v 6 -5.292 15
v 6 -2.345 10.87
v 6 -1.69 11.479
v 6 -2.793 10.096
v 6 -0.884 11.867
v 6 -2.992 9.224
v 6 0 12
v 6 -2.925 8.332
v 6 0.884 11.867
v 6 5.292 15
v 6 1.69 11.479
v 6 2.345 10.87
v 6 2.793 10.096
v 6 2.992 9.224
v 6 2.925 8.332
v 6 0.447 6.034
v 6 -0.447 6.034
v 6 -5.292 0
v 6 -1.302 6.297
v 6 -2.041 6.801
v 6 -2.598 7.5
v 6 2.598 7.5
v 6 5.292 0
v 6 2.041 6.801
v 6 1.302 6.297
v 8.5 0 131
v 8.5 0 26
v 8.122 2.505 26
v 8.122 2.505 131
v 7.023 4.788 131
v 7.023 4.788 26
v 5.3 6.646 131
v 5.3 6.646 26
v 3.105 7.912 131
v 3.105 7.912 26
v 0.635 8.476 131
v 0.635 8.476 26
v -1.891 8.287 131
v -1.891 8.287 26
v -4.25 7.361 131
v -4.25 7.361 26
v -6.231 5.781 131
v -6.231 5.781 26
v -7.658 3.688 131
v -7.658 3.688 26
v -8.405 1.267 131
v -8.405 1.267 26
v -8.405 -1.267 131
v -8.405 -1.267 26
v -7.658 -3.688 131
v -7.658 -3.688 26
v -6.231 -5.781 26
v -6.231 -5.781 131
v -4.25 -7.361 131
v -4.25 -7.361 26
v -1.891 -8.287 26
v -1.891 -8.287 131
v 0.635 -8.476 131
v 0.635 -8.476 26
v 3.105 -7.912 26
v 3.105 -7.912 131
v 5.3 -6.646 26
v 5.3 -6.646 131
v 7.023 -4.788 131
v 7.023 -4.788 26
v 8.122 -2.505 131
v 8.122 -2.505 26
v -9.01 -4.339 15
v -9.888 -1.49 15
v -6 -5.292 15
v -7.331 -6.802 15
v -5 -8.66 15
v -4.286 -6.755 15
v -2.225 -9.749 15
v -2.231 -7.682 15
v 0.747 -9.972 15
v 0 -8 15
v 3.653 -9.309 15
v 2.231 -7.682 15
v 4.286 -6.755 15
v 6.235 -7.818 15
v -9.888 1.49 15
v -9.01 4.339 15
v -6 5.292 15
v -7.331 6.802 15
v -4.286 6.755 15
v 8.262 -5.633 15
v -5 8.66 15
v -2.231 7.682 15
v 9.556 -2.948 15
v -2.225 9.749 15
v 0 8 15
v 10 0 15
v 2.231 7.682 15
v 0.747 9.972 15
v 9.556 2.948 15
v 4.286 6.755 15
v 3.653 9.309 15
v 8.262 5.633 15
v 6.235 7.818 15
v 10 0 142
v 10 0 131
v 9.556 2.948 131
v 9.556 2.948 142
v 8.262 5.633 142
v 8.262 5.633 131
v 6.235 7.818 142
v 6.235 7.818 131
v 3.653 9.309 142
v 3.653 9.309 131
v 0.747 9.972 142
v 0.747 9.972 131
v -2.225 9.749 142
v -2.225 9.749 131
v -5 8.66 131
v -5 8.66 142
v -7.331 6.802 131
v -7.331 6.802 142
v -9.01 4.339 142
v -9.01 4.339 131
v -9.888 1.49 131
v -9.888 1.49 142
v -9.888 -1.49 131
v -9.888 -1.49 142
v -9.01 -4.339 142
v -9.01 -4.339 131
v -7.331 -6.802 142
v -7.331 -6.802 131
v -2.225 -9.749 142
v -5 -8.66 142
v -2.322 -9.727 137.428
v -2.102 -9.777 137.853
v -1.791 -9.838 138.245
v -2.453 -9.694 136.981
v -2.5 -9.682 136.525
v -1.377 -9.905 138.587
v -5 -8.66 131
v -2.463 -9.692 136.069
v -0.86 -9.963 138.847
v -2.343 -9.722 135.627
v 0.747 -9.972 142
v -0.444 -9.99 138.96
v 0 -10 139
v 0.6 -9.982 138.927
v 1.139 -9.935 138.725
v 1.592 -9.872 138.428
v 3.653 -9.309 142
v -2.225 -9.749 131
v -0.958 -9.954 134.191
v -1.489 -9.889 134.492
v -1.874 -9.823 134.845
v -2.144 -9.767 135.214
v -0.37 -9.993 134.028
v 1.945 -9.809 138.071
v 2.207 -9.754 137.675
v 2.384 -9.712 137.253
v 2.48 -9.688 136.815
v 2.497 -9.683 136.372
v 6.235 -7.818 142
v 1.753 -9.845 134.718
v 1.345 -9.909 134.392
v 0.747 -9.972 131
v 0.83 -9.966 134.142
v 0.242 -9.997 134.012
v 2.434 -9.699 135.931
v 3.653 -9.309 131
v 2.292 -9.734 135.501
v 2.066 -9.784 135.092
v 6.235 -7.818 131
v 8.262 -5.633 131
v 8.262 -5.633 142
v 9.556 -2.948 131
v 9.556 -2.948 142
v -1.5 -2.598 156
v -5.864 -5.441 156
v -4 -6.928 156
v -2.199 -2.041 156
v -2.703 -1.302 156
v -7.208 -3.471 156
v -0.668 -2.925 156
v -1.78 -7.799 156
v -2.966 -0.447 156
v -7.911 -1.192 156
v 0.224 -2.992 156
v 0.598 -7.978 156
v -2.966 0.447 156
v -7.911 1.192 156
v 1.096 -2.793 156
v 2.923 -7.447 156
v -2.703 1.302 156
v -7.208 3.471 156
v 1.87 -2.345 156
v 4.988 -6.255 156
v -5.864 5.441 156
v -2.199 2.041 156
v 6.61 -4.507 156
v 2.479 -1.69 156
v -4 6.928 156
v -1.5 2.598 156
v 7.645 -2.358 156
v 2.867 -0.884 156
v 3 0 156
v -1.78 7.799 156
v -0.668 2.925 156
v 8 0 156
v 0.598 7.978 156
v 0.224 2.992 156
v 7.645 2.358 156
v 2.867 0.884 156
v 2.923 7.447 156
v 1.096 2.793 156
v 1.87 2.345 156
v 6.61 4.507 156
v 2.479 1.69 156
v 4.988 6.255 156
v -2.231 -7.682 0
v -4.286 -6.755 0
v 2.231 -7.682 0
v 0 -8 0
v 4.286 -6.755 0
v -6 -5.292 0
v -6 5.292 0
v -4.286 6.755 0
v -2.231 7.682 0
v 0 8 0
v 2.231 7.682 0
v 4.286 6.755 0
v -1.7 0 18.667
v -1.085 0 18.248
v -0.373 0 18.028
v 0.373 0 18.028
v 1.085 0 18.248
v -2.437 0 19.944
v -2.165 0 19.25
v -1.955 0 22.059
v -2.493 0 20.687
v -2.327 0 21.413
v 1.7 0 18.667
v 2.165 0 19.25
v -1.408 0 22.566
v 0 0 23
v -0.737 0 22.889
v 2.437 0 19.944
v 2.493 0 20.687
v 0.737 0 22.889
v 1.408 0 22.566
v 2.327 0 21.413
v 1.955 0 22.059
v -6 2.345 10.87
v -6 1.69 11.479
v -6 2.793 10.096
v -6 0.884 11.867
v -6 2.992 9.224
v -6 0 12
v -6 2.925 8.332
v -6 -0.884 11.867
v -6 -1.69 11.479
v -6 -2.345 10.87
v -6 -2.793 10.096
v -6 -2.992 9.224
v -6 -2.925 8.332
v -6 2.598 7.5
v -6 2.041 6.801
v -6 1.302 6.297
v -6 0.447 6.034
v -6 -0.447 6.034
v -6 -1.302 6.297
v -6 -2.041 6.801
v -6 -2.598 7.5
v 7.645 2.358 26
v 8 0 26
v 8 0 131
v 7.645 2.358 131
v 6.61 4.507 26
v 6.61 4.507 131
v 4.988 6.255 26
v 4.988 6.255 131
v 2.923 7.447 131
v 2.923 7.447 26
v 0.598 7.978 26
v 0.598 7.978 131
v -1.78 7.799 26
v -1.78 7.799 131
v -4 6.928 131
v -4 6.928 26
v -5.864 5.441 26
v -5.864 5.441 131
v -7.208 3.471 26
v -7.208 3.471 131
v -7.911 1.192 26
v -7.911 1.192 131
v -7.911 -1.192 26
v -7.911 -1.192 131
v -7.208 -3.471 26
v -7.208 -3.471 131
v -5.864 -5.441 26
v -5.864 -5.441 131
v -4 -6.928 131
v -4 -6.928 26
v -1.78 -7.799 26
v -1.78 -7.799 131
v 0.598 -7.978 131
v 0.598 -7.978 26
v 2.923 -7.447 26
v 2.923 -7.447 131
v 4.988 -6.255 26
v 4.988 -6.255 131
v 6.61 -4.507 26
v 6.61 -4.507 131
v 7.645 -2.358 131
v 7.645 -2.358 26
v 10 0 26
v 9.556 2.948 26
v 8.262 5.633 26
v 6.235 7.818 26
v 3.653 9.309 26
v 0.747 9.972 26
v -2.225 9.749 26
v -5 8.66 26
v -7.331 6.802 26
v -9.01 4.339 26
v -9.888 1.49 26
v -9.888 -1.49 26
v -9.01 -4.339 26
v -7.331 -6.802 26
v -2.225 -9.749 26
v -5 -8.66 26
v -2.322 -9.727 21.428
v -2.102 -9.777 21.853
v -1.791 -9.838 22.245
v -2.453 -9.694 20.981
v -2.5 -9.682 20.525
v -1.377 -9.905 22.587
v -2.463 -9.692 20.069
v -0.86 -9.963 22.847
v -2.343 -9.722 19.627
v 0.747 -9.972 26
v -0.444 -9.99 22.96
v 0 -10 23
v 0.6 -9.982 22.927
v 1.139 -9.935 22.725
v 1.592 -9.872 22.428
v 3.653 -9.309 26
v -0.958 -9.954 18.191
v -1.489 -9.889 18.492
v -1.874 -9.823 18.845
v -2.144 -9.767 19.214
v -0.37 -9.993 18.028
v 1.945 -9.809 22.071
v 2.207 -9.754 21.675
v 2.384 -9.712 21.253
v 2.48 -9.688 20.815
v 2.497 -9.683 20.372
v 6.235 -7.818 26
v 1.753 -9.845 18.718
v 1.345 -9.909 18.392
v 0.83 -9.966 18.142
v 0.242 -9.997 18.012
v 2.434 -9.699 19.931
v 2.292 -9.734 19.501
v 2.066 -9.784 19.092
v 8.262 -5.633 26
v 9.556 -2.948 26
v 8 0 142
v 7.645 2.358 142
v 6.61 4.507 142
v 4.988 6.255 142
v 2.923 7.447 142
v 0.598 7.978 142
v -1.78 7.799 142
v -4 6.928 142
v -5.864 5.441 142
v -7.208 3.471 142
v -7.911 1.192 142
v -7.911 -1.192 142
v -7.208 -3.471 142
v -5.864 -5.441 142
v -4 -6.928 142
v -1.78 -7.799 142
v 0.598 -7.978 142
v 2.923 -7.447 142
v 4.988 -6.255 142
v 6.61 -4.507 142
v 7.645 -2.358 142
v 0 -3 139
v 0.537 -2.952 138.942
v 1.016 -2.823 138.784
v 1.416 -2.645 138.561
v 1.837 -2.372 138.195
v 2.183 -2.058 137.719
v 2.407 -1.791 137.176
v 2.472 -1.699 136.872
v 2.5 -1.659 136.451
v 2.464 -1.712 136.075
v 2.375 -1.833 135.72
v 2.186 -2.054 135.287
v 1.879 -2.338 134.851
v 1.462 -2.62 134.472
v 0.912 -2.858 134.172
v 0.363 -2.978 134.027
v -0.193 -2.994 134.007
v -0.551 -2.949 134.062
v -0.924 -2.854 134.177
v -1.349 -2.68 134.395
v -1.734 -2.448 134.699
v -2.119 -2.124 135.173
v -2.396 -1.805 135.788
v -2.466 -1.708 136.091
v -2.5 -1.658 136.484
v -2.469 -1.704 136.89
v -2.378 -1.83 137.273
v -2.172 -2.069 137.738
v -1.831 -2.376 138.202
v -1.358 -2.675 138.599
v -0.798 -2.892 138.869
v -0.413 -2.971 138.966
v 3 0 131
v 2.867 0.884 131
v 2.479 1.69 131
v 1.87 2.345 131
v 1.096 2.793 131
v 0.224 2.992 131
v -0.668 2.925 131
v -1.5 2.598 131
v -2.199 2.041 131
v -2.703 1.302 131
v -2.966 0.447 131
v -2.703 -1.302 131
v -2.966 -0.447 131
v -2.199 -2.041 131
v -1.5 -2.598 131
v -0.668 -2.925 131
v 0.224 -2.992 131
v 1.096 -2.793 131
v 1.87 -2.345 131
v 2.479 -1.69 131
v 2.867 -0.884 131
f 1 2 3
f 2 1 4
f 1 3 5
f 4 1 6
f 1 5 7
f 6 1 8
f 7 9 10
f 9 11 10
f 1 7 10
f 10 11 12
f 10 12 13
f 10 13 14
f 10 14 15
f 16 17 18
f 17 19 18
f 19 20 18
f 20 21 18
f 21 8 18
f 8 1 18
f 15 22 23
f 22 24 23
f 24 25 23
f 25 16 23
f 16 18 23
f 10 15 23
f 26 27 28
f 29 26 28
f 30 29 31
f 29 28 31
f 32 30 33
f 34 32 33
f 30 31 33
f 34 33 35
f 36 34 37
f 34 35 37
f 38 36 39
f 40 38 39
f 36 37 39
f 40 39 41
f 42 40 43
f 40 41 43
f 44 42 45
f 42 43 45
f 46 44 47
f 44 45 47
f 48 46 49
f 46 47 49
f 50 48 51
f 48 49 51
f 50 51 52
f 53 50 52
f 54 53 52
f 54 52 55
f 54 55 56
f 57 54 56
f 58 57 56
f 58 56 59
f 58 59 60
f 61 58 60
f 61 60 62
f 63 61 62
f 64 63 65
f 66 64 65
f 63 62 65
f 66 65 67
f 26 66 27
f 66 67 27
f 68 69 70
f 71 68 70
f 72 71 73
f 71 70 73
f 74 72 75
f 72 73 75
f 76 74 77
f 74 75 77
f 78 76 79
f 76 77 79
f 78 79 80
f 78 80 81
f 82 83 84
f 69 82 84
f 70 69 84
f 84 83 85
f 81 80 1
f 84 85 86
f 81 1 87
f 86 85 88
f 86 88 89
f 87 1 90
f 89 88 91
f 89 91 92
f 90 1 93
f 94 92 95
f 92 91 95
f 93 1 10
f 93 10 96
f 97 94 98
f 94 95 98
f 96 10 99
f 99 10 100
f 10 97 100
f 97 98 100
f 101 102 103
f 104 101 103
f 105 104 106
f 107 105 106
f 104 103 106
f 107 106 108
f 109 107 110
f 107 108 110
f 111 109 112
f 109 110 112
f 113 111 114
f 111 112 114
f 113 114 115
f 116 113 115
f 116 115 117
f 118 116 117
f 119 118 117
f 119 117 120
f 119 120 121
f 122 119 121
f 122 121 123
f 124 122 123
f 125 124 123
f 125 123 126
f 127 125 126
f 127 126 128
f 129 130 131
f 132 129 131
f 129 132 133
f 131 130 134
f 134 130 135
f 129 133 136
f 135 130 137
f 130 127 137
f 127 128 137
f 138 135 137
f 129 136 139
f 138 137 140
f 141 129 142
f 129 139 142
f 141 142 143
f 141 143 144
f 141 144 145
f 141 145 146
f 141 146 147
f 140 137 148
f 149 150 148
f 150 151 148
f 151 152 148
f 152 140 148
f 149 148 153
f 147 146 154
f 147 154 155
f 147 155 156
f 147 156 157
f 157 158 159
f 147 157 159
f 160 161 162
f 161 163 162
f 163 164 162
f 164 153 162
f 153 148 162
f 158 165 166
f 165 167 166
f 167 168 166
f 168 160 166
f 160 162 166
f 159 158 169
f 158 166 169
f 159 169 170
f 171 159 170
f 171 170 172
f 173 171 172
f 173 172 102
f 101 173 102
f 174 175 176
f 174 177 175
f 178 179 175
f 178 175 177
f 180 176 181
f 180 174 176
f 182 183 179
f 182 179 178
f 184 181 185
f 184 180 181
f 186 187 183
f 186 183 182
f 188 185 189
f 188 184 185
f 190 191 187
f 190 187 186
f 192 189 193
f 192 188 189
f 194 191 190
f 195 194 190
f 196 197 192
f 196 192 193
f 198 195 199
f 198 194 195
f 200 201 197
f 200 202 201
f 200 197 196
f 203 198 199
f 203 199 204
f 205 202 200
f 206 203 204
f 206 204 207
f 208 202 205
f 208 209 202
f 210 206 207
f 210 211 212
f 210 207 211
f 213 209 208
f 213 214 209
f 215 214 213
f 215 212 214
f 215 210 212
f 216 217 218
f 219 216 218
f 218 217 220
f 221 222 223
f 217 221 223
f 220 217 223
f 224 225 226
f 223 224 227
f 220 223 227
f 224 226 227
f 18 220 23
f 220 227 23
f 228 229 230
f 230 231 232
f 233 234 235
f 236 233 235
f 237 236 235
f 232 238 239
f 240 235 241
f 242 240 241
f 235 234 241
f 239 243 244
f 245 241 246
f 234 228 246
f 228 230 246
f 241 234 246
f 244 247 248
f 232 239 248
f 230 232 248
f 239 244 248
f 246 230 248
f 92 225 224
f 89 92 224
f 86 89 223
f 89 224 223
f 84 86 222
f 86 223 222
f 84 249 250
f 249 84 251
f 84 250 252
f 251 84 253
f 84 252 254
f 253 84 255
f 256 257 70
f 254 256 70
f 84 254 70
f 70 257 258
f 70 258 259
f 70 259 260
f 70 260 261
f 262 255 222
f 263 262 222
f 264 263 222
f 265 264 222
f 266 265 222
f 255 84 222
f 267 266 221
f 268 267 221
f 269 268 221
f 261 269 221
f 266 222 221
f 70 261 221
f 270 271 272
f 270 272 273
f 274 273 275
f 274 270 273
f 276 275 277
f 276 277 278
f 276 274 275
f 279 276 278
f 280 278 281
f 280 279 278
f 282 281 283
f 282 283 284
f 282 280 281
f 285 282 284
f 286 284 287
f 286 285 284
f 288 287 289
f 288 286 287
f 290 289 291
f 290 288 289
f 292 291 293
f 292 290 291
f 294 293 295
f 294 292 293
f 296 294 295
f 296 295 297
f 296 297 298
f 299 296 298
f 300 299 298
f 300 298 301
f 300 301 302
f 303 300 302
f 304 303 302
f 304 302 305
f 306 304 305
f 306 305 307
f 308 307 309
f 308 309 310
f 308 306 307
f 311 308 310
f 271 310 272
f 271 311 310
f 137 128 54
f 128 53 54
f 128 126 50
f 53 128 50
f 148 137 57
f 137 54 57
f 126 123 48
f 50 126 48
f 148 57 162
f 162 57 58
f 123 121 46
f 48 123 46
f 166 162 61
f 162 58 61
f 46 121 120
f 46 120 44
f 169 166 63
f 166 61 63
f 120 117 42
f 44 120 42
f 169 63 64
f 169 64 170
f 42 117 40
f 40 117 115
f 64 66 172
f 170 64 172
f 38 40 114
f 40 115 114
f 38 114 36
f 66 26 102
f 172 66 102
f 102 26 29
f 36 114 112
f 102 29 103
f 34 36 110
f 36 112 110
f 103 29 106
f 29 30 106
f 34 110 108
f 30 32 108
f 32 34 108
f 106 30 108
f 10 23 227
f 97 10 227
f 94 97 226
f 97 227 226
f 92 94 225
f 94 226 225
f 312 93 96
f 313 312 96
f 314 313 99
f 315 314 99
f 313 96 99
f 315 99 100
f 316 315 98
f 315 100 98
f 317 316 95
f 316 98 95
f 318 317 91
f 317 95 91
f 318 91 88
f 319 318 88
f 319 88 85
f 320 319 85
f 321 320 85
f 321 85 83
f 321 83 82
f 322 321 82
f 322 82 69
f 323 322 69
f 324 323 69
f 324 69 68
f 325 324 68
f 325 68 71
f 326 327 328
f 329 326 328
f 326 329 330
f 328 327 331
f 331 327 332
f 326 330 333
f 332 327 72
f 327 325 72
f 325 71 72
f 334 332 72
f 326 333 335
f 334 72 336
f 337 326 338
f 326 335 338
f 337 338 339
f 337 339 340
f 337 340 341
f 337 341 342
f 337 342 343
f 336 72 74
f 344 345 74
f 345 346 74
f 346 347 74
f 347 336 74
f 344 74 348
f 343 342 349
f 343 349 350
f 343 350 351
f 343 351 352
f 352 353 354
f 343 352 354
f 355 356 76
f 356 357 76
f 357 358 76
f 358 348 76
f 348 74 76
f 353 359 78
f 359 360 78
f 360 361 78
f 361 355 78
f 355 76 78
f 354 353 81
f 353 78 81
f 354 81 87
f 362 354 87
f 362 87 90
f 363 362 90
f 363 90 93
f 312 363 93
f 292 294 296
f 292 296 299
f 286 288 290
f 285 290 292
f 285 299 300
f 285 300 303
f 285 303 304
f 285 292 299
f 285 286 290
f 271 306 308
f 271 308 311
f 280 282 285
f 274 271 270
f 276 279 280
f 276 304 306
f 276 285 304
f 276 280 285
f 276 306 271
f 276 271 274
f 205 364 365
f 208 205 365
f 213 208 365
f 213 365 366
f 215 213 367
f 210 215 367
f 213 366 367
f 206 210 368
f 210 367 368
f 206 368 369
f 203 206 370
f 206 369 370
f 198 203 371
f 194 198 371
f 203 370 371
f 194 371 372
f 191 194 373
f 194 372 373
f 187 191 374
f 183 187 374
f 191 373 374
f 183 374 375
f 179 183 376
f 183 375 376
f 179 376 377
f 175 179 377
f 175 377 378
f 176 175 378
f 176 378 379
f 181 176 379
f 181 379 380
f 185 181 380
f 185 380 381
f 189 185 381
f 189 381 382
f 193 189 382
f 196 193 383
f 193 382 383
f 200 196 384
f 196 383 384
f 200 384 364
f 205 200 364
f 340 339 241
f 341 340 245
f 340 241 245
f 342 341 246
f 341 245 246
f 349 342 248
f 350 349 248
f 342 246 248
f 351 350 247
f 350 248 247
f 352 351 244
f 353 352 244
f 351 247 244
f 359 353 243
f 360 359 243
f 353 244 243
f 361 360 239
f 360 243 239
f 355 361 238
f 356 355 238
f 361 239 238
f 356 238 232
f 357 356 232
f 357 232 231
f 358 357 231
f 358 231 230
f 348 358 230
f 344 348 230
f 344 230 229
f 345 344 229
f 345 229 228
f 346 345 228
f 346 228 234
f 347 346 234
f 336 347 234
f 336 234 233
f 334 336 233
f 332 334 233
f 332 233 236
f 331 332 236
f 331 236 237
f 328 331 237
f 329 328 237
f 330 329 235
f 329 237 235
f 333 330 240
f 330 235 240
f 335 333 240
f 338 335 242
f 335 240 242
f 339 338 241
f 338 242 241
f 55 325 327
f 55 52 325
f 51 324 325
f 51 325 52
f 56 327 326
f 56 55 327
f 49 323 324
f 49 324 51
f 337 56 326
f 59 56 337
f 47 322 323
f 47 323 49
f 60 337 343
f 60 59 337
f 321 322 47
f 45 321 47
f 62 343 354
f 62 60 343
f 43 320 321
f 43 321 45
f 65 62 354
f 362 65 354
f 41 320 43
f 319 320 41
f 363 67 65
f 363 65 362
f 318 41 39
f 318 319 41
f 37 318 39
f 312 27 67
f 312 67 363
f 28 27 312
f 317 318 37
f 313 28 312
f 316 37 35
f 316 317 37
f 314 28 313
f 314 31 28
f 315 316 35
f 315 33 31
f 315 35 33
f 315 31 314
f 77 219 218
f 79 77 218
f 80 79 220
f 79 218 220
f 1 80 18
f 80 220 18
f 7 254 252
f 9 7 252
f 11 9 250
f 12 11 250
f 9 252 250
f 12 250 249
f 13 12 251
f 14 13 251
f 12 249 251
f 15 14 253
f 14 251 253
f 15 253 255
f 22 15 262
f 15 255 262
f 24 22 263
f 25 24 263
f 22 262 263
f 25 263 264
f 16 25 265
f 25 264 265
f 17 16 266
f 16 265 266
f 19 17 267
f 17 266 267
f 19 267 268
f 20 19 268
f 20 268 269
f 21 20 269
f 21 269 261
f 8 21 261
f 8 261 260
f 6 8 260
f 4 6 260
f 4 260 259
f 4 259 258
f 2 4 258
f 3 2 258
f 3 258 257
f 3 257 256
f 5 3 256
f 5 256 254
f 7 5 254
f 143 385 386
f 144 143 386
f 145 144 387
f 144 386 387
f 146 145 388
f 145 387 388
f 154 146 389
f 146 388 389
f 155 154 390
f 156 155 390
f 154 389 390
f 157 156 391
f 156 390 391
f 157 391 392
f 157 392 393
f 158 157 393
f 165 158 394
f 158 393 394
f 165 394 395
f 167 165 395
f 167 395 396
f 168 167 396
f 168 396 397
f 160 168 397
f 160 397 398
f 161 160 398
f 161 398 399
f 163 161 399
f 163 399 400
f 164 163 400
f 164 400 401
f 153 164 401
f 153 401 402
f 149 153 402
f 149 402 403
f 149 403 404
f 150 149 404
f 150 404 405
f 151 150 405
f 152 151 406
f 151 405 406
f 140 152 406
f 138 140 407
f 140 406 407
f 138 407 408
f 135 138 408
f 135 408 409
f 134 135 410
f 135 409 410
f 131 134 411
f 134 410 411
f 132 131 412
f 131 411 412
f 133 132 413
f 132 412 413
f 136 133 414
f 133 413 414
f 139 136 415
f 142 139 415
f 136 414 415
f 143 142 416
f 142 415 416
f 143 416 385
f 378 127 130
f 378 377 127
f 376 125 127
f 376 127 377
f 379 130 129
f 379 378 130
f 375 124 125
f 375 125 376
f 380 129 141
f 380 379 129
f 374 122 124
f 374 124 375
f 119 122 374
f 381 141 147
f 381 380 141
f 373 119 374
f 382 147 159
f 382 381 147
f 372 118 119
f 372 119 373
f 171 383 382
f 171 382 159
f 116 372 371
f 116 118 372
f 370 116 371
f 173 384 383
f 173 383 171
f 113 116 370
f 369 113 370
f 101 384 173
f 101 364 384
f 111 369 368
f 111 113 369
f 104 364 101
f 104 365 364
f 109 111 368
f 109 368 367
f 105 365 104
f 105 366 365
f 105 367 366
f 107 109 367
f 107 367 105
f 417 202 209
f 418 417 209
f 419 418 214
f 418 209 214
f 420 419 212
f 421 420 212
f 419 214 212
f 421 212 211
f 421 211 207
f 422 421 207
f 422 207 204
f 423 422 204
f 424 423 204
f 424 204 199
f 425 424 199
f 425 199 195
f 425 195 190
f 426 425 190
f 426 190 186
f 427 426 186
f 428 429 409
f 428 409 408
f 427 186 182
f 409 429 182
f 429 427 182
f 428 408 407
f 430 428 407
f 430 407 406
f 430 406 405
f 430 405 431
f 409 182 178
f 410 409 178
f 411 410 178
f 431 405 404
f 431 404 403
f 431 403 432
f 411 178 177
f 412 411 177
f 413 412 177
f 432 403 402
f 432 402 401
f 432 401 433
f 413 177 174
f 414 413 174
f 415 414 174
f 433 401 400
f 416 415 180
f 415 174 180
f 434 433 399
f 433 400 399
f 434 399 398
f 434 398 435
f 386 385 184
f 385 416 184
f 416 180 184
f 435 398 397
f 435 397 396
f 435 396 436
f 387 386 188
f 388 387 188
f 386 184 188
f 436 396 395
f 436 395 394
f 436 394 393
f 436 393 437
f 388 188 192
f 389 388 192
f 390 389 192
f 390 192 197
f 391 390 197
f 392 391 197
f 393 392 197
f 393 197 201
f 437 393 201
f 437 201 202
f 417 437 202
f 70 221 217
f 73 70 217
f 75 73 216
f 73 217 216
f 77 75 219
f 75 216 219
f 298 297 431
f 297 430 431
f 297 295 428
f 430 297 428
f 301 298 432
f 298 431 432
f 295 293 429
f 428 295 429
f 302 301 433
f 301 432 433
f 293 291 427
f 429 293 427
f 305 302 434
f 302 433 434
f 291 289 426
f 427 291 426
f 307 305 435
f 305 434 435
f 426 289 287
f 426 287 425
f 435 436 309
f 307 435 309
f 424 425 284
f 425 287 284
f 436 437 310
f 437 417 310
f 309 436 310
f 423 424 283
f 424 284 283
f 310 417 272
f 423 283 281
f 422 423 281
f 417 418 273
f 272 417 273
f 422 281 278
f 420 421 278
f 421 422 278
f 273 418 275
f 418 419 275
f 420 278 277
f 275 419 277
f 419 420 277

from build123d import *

# Parameters (mm, degrees)
EXTRUDE_1_DEPTH     = 15
SKETCH_2_R          = 3
CUT_EXTRUDE_1_DEPTH = 21.808652047
SKETCH_3_R          = 10
EXTRUDE_2_DEPTH     = 11
SKETCH_4_R          = 2.5
CUT_EXTRUDE_3_DEPTH = 10
SKETCH_5_R          = 8.5
SKETCH_5_R_2        = 8
EXTRUDE_4_DEPTH     = 105
SKETCH_6_R          = 10
EXTRUDE_5_DEPTH     = 11
SKETCH_7_R          = 2.5
CUT_EXTRUDE_4_DEPTH = 10
SKETCH_8_R          = 8
EXTRUDE_6_DEPTH     = 14
SKETCH_9_R          = 3
CUT_EXTRUDE_5_DEPTH = 100


with BuildPart() as part:
    # 草图1 → 凸台-拉伸1 (new body)
    with BuildSketch(Plane.XY):
        with BuildLine():
            ThreePointArc((0, 8), (-3.291502622, 7.291502622), (-6, 5.291502622))
            Line((-6, 5.291502622), (-6, -5.291502622))
            ThreePointArc((-6, -5.291502622), (-3.291502622, -7.291502622), (0, -8))
            Line((0, -8), (0, 8))
        make_face()
        with BuildLine():
            ThreePointArc((6, 5.291502622), (3.291502622, 7.291502622), (0, 8))
            Line((0, 8), (0, -8))
            ThreePointArc((0, -8), (3.291502622, -7.291502622), (6, -5.291502622))
            Line((6, -5.291502622), (6, 5.291502622))
        make_face()
    extrude(amount=EXTRUDE_1_DEPTH)

    # 草图2 → 切除-拉伸1 (cut, through all)
    with BuildSketch(Plane.ZY.offset(6)):
        with Locations((9, 0)):
            Circle(SKETCH_2_R)
    extrude(amount=-CUT_EXTRUDE_1_DEPTH, mode=Mode.SUBTRACT)

    # 草图3 → 凸台-拉伸2 (add)
    with BuildSketch(Plane.XY.offset(15)):
        Circle(SKETCH_3_R)
    extrude(amount=EXTRUDE_2_DEPTH)

    # 草图4 → 切除-拉伸3 (cut)
    with BuildSketch(Plane(origin=(0, 0, 0), x_dir=(1, 0, 0), z_dir=(0, 1, 0))):
        with Locations(Location((0, -20.5, 0), (0, 0, 270))):
            Circle(SKETCH_4_R)
    extrude(amount=-CUT_EXTRUDE_3_DEPTH, mode=Mode.SUBTRACT)

    # 草图5 → 凸台-拉伸4 (add)
    with BuildSketch(Plane.XY.offset(26)):
        Circle(SKETCH_5_R)
        Circle(SKETCH_5_R_2, mode=Mode.SUBTRACT)
    extrude(amount=EXTRUDE_4_DEPTH)

    # 草图6 → 凸台-拉伸5 (add)
    with BuildSketch(Plane.XY.offset(131)):
        Circle(SKETCH_6_R)
    extrude(amount=EXTRUDE_5_DEPTH)

    # 草图7 → 切除-拉伸4 (cut)
    with BuildSketch(Plane(origin=(0, 0, 0), x_dir=(1, 0, 0), z_dir=(0, 1, 0))):
        with Locations(Location((0, -136.5, 0), (0, 0, 270))):
            Circle(SKETCH_7_R)
    extrude(amount=-CUT_EXTRUDE_4_DEPTH, mode=Mode.SUBTRACT)

    # 草图8 → 凸台-拉伸6 (add)
    with BuildSketch(Plane.XY.offset(142)):
        Circle(SKETCH_8_R)
    extrude(amount=EXTRUDE_6_DEPTH)

    # 草图9 → 切除-拉伸5 (cut)
    with BuildSketch(Plane.XY.offset(156)):
        Circle(SKETCH_9_R)
    extrude(amount=-CUT_EXTRUDE_5_DEPTH, mode=Mode.SUBTRACT)


solid = part.part
